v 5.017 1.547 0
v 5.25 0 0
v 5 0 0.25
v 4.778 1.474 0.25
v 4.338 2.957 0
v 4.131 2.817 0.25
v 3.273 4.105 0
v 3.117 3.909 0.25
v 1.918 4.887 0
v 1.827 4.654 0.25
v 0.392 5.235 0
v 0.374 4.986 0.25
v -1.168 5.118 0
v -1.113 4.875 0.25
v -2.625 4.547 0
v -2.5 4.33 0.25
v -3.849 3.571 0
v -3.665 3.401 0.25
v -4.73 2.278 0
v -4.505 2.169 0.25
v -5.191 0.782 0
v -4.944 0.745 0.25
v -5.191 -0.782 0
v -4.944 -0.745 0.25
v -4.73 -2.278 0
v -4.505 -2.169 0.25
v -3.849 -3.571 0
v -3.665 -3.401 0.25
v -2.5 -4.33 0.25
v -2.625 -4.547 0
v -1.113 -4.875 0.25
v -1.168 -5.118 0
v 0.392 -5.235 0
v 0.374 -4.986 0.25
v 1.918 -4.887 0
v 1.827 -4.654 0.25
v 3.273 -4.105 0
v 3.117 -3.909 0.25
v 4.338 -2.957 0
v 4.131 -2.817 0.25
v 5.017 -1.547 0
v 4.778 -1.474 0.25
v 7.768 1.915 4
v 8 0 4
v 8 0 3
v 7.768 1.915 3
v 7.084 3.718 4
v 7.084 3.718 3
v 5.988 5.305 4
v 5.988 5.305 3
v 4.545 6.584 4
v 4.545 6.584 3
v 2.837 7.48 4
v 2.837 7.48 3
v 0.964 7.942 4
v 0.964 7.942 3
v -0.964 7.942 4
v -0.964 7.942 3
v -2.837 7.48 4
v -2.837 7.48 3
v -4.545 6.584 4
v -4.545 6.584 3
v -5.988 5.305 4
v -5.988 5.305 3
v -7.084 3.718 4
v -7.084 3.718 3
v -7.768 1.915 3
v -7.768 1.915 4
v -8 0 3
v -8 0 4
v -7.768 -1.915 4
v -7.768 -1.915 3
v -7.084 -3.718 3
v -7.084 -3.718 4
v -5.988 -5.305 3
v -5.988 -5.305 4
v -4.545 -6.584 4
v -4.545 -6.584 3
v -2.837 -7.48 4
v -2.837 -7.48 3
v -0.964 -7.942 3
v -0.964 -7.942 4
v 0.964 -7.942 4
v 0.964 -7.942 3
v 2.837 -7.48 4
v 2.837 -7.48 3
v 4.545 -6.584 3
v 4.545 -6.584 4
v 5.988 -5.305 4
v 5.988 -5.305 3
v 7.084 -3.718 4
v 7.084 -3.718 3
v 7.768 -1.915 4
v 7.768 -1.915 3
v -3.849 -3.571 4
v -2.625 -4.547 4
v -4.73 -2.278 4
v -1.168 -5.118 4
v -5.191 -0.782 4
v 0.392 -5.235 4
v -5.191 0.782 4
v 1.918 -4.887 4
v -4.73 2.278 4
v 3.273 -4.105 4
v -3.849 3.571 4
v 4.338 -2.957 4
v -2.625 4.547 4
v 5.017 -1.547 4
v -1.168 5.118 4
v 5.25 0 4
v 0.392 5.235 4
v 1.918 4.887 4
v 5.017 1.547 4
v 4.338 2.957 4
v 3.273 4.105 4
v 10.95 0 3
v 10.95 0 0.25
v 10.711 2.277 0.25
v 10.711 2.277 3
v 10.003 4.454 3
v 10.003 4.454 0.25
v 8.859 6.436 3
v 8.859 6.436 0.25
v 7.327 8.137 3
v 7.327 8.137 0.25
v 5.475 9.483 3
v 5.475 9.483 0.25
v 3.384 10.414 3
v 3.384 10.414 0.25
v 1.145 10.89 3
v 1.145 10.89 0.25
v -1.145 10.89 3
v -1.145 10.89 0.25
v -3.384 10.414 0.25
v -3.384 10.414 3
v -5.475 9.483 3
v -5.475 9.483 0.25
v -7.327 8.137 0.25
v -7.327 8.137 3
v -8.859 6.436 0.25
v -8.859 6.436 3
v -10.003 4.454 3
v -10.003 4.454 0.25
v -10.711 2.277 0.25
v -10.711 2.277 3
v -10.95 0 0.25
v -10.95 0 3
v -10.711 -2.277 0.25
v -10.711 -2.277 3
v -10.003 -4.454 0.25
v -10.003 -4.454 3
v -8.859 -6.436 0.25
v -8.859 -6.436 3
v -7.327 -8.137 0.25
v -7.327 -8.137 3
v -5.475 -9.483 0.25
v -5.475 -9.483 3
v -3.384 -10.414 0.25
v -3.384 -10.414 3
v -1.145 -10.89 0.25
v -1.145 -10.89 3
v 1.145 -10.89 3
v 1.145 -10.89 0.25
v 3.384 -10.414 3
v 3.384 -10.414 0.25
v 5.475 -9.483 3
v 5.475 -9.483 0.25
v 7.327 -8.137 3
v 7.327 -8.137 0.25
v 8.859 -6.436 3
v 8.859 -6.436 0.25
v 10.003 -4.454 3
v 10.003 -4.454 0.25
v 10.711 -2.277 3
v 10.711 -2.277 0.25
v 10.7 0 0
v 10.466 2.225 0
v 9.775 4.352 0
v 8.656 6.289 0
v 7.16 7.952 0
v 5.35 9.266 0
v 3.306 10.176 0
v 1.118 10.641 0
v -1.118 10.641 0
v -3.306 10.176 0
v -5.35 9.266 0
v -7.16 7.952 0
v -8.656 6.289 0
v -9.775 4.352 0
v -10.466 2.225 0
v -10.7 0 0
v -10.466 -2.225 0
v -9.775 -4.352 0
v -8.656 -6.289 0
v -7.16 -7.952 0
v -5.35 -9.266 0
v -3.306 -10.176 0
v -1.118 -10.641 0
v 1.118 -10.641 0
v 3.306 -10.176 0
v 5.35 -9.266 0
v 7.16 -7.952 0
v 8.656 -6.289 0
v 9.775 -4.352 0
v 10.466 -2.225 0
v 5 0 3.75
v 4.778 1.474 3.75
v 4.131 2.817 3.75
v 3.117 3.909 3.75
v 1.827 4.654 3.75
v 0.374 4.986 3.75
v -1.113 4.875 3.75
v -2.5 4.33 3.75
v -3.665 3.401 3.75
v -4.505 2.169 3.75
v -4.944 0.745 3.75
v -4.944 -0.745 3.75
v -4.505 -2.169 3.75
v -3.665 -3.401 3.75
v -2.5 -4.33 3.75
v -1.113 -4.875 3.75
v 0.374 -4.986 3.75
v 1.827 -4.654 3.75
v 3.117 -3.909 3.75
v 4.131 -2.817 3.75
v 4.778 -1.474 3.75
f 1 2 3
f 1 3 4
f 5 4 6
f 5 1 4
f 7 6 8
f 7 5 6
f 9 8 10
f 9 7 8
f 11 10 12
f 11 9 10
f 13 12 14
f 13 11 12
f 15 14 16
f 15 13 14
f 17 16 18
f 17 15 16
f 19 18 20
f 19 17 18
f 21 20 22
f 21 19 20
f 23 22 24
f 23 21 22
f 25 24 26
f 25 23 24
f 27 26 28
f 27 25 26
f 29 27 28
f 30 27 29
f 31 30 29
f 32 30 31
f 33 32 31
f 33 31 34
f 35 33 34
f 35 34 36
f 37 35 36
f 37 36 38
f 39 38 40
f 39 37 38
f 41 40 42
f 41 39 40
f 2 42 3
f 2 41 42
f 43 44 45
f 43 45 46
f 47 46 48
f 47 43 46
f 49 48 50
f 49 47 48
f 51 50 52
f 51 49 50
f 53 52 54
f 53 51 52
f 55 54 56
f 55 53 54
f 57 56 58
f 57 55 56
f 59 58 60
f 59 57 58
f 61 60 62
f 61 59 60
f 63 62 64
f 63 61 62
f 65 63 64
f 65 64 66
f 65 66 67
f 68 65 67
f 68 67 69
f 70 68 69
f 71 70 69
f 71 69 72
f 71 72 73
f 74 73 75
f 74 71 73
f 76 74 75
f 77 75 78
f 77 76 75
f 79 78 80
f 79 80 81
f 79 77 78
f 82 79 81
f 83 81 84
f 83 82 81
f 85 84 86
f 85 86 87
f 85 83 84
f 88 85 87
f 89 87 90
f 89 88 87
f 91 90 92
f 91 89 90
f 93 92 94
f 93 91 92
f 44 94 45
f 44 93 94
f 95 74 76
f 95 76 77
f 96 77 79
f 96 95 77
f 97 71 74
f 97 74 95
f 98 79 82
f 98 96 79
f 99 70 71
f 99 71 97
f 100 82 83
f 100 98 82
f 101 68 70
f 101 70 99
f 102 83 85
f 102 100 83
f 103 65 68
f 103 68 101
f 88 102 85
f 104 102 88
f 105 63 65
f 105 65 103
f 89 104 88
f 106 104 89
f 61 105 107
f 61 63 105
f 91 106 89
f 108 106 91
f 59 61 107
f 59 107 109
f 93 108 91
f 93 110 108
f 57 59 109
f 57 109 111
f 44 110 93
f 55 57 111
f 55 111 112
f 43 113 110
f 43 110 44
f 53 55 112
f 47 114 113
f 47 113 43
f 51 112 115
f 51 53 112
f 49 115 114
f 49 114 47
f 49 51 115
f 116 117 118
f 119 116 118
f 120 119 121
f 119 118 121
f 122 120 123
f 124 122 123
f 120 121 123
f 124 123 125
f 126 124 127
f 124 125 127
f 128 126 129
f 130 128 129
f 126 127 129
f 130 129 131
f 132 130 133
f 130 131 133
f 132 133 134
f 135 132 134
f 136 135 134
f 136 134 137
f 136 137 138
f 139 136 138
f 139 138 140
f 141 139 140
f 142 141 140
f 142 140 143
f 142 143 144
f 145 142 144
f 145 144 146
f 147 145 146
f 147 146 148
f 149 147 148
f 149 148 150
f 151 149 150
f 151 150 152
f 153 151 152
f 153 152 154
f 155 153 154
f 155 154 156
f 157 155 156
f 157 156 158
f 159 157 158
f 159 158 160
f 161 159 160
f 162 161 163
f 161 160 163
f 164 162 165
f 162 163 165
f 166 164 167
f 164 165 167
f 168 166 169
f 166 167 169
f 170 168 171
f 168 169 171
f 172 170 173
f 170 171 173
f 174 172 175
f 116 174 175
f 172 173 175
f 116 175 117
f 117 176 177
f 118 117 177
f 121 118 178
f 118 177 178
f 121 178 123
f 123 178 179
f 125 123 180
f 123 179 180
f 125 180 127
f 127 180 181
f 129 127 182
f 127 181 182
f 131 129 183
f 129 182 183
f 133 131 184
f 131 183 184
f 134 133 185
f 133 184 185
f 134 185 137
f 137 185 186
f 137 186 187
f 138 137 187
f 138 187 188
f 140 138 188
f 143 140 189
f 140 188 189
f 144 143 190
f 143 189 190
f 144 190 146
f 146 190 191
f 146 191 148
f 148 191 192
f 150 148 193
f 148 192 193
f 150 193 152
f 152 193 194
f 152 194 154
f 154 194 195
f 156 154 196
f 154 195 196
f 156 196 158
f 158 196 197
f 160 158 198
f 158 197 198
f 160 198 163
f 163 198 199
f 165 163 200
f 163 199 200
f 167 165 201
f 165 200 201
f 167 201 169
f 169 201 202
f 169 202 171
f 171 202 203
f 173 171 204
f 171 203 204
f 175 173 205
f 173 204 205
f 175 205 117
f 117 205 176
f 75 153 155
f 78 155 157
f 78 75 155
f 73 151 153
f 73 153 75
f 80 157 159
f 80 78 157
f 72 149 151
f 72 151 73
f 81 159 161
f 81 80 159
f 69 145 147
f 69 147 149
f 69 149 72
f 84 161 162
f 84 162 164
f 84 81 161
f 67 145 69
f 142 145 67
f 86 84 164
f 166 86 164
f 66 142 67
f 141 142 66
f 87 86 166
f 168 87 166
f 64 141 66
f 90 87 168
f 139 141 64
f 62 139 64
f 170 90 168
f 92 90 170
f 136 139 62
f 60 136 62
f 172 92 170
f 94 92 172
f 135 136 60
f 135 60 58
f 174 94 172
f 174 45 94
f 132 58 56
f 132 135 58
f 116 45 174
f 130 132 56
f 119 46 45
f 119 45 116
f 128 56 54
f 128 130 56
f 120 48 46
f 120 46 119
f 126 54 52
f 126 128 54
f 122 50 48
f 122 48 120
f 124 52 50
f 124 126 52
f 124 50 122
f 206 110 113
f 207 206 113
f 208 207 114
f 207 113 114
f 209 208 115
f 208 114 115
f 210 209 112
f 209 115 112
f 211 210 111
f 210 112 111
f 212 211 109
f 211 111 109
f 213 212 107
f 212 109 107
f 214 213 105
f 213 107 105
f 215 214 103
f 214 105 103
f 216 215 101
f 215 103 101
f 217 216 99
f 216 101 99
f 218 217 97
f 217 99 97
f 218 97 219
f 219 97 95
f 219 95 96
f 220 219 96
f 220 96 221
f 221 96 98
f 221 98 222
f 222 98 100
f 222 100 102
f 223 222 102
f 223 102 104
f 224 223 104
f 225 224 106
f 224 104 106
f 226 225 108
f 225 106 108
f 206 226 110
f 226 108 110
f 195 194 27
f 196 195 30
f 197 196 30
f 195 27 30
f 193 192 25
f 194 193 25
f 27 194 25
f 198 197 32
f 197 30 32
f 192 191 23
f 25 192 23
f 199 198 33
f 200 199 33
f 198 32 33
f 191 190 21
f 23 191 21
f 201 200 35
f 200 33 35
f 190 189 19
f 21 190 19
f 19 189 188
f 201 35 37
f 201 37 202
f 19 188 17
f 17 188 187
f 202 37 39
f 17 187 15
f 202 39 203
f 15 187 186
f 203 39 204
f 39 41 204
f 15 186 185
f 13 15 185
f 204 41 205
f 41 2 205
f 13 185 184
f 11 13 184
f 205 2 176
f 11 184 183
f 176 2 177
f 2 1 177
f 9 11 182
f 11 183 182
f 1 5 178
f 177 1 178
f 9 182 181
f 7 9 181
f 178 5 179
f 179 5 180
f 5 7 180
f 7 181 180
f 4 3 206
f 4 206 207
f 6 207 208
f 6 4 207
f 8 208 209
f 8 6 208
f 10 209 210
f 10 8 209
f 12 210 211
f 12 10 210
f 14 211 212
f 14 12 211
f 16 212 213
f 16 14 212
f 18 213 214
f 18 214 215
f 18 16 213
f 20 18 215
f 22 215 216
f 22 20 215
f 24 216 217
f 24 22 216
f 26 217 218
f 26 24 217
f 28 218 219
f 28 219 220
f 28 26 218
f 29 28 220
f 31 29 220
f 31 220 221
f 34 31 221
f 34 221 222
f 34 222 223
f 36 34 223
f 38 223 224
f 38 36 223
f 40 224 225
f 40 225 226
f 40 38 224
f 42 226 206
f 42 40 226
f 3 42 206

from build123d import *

# Parameters (mm, degrees)
SKETCH017_R     = 10.95
SKETCH017_R_2   = 5
PAD007_DEPTH    = 4
CHAMFER_SIZE    = 0.25
SKETCH023_R     = 10.95
SKETCH023_R_2   = 8
POCKET009_DEPTH = 1


with BuildPart() as part:
    # Sketch017 → Pad007 (new body)
    with BuildSketch(Plane.XY):
        Circle(SKETCH017_R)
        Circle(SKETCH017_R_2, mode=Mode.SUBTRACT)
    extrude(amount=PAD007_DEPTH)

    # Chamfer
    chamfer_edges = [part.edges().sort_by_distance(p)[0] for p in [
        (-10.95, 0, 4),
        (-5, 0, 4),
        (-10.95, 0, 0),
        (-5, 0, 0),
    ]]
    chamfer(chamfer_edges, length=CHAMFER_SIZE)

    # Sketch023 (on Face4 of Pad007) → Pocket009 (cut)
    with BuildSketch(Plane.XY.offset(4)):
        Circle(SKETCH023_R)
        Circle(SKETCH023_R_2, mode=Mode.SUBTRACT)
    extrude(amount=-POCKET009_DEPTH, mode=Mode.SUBTRACT)


solid = part.part
